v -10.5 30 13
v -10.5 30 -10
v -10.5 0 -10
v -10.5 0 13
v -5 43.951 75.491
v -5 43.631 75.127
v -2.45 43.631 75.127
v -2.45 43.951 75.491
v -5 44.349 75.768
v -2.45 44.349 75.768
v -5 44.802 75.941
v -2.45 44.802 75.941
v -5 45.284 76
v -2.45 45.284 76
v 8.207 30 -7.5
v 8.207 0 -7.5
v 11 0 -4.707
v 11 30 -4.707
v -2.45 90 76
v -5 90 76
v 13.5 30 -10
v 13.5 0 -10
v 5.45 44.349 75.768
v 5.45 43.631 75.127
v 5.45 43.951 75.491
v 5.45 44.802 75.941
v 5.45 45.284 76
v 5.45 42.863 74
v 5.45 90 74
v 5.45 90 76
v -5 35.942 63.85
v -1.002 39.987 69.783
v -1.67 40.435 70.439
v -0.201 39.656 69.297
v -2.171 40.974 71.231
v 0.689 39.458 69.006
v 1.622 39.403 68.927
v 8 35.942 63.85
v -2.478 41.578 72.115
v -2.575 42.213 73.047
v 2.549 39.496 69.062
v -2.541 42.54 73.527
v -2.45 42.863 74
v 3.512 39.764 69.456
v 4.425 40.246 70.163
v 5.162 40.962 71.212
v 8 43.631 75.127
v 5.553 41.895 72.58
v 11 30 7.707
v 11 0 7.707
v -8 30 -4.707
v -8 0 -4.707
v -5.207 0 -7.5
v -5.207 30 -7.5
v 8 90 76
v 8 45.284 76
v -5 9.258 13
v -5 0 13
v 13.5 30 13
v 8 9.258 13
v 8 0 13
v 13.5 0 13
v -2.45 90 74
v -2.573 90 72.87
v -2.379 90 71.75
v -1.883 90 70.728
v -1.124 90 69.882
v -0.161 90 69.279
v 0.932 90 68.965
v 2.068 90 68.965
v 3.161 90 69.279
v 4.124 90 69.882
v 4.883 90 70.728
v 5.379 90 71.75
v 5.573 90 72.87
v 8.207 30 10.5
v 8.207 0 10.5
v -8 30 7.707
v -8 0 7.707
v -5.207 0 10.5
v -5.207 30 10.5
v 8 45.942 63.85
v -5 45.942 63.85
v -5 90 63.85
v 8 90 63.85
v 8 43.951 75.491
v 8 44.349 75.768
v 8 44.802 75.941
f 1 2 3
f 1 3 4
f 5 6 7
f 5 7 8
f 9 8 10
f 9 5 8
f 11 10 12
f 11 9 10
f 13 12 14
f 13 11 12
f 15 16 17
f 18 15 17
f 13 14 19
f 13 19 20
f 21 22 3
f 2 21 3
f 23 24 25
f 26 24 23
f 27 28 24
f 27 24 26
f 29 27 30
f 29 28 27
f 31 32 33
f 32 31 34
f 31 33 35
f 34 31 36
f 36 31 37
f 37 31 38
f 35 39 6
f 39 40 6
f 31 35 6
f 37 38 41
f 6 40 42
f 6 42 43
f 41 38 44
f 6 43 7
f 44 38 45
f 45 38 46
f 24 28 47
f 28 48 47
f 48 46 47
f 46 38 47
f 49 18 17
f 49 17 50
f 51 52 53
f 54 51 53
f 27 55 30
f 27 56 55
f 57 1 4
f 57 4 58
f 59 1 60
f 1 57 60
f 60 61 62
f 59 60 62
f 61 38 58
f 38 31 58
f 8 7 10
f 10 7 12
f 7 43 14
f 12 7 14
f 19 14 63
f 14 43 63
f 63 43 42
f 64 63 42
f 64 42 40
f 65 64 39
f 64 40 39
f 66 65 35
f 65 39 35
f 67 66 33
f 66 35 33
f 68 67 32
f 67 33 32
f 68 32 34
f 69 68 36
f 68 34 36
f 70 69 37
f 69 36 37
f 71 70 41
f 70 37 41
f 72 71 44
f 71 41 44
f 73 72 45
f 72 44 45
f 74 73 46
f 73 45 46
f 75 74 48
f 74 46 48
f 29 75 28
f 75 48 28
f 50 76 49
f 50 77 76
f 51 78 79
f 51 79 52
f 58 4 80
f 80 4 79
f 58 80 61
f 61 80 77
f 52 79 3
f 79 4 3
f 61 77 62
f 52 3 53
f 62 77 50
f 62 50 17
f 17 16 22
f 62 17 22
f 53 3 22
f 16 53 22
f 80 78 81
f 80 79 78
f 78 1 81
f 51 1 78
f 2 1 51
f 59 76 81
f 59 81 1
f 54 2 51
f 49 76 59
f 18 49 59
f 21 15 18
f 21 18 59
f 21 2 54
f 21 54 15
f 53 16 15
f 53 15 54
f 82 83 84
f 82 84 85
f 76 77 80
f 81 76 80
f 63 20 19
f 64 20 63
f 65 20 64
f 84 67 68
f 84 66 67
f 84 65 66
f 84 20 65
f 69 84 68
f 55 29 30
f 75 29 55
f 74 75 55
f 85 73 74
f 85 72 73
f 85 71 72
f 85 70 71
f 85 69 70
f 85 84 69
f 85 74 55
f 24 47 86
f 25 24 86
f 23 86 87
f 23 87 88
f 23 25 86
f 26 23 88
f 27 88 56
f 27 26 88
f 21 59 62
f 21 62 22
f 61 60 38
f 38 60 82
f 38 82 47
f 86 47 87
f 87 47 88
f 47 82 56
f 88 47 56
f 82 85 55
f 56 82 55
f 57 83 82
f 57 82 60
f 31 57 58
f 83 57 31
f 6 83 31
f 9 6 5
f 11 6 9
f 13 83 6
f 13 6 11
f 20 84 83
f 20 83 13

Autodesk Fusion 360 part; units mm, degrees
sketch "Sketch1" plane through (0, 0, 0) normal (0, 1, 0) x (1, 0, 0)
sketch "Sketch2" plane through (0, 0, 0) normal (1, 0, 0) x (0, 0, -1)
sketch "Sketch3" plane through (0, 0, 0) normal (0, 1, 0) x (1, 0, 0)
sketch "Sketch4" plane through (0, 0, 0) normal (0, 1, 0) x (1, 0, 0)
  line L0 (1.5, 7) -> (-5, 7)
  line L1 (8, -10) -> (10.5, -7.5)
  line L2 (10.5, -1.5) -> (10.5, -7.5)
  line L3 (-7.5, -1.5) -> (-7.5, -7.5)
  line L4 (1.5, 7) -> (8, 7)
  line L5 (10.5, -1.5) -> (10.5, -7.5)
  line L6 (1.5, -10) -> (8, -10)
  line L7 (10.5, -10) -> (-7.5, 7) construction
  line L8 (1.5, -10) -> (8, -10)
  line L9 (10.5, 7) -> (10.5, -10)
  line L10 (8, 7) -> (10.5, 4.5)
  line L11 (-7.5, -1.5) -> (-7.5, 4.5)
  line L12 (10.5, -1.5) -> (10.5, 4.5)
  line L13 (-7.5, 7) -> (10.5, 7)
  line L14 (-7.5, -7.5) -> (-5, -10)
  line L15 (-7.5, -10) -> (10.5, 7) construction
  line L16 (-7.5, 4.5) -> (-5, 7)
  line L17 (-7.5, -10) -> (-7.5, 7)
  line L18 (10.5, -10) -> (-7.5, -10)
  line L19 (1.5, -10) -> (-5, -10)
  line L20 (13.5, 10) -> (-10.5, 10)
  line L21 (-10.5, 10) -> (-10.5, -13)
  line L22 (-10.5, -13) -> (13.5, -13)
  line L23 (13.5, -13) -> (13.5, 10)
  line L24 (13.5, 10) -> (-10.5, -13) construction
  line L25 (-10.5, 10) -> (13.5, -13) construction
  line L26 (1.5, -10.5) -> (-5.2071, -10.5)
  line L27 (-8, -7.7071) -> (-5.2071, -10.5)
  line L28 (-8, -1.5) -> (-8, -7.7071)
  line L29 (-8, -1.5) -> (-8, 4.7071)
  line L30 (-8, 4.7071) -> (-5.2071, 7.5)
  line L31 (1.5, 7.5) -> (-5.2071, 7.5)
  line L32 (1.5, 7.5) -> (8.2071, 7.5)
  line L33 (8.2071, 7.5) -> (11, 4.7071)
  line L34 (11, -1.5) -> (11, 4.7071)
  line L35 (11, -1.5) -> (11, -7.7071)
  line L36 (8.2071, -10.5) -> (11, -7.7071)
  line L37 (1.5, -10.5) -> (8.2071, -10.5)
  point P0 (1.5, -1.5)
  point P1 (1.5, -1.5)
  point P2 (1.5, -1.5)
  dimension "d1" = 18
  dimension "d2" = 17
  dimension "d3" = 6
  dimension "d4" = 6
  dimension "d5" = 6.5
  dimension "d6" = 6.5
  dimension "d7" = 6
  dimension "d8" = 6
  dimension "d9" = 6.5
  dimension "d10" = 6.5
  dimension "d11" = 6.5
  dimension "d12" = 6
  dimension "d13" = 24
  dimension "d14" = 23
  dimension "d15" = -0.5
extrude "Extrude1" add sketch "Sketch4" along normal blind 30 contours L13 L17 L30 | L9 L13 L33 | L17 L18 L27 | L9 L18 L36 | L20 L21 L22 L23 makes body 1
sketch "Sketch5" plane through (0, 0, 0) normal (0, -1, 0) x (1, 0, 0)
  line L0 (-8, -4.7071) -> (-8, 7.7071)
  line L1 (-8, 7.7071) -> (-5.2071, 10.5)
  line L2 (-5.2071, 10.5) -> (8.2071, 10.5)
  line L3 (8.2071, 10.5) -> (11, 7.7071)
  line L4 (11, 7.7071) -> (11, -4.7071)
  line L5 (11, -4.7071) -> (8.2071, -7.5)
  line L6 (8.2071, -7.5) -> (-5.2071, -7.5)
  line L7 (-5.2071, -7.5) -> (-8, -4.7071)
  line L8 (13.5, -10) -> (13.5, 13)
  line L9 (13.5, 13) -> (-10.5, 13)
  line L10 (-10.5, 13) -> (-10.5, -10)
  line L11 (-10.5, -10) -> (13.5, -10)
  line L12 (-10.5, 13) -> (13.5, -10)
  line L13 (13.5, 13) -> (-10.5, -10)
  point P0 (1.5, 1.5)
sketch "Sketch6" plane through (0, 0, 0) normal (0, -1, 0) x (1, 0, 0)
  line L0 (-8, -4.7071) -> (-8, 7.7071)
  line L1 (-8, 7.7071) -> (-5.2071, 10.5)
  line L2 (-5.2071, 10.5) -> (8.2071, 10.5)
  line L3 (8.2071, 10.5) -> (11, 7.7071)
  line L4 (11, 7.7071) -> (11, -4.7071)
  line L5 (11, -4.7071) -> (8.2071, -7.5)
  line L6 (8.2071, -7.5) -> (-5.2071, -7.5)
  line L7 (-5.2071, -7.5) -> (-8, -4.7071)
  line L8 (13.5, -10) -> (13.5, 13)
  line L9 (13.5, 13) -> (-10.5, 13)
  line L10 (-10.5, 13) -> (-10.5, -10)
  line L11 (-10.5, -10) -> (13.5, -10)
  line L12 (1.5, 13) -> (1.5, 73)
  dimension "d18" = 60
ref_plane "WorkPlane1" through (1.5, 0, 43) normal (0, -1, 0) x (0, 0, 1)
sketch "Sketch7" plane through (1.5, 0, 43) normal (0, -1, 0) x (0, 0, 1)
  line L0 (-30, 0) -> (-30, -90)
  dimension "d20" = 90
ref_plane "WorkPlane2" through (46.5, 0, 13) normal (0, 0, -1) x (1, 0, 0)
sketch "Sketch25" plane through (1.5, 0, 43) normal (0, -1, 0) x (1, 0, 0)
  circle A0 centre (0, 30) radius 4.075
  dimension "d74" = 8.15
sketch "Sketch26" plane through (0, 0, 0) normal (0, 1, 0) x (1, 0, 0)
  circle A0 centre (1.5, -73) radius 4.075
  line L0 (8, -74) -> (-5, -74)
  line L1 (-5, -74) -> (-5, -63.85)
  line L2 (-5, -63.85) -> (8, -63.85)
  line L3 (8, -63.85) -> (8, -74)
  line L4 (8, -74) -> (-5, -63.85) construction
  line L5 (-5, -74) -> (8, -63.85) construction
  point P0 (1.5, -68.925)
extrude "Extrude18" add sketch "Sketch26" along normal blind 90 separate body contours A0 L0 L1 L2 L3 makes body 2
extrude "Extrude19" add 2 faces at (-3.3003, 60, 74) (7.1501, 30, 74) along direction (0, 0, 1) blind 2 on bodies 2 bodies 2
sketch "Sketch27" plane through (8, 0, 0) normal (1, 0, 0) x (0, 0, -1)
  line L0 (-76, 0) -> (-63.85, 0)
  line L1 (-63.85, 0) -> (-63.85, 90)
  line L2 (-63.85, 90) -> (-76, 90)
  line L3 (-76, 90) -> (-76, 0)
  line L4 (-13, 0) -> (10, 0)
  line L5 (10, 0) -> (10, 30)
  line L6 (10, 30) -> (-13, 30)
  line L7 (-13, 30) -> (-13, 0)
  line L8 (-63.85, 90) -> (-13, 30)
  line L9 (-63.85, 90) -> (-63.85, 75)
  line L10 (-13, 30) -> (-13, 15)
  line L11 (-63.85, 75.12) -> (-13, 15)
  line L12 (-63.85, 45) -> (-38.425, 45.06)
  line L13 (-63.85, 35.9416) -> (-30.7126, 35.9416)
  line L14 (-63.85, 35.9416) -> (-76, 35.9416)
extrude "Extrude20" cut sketch "Sketch27" against normal blind 30 contours L0 L1 L3 L14 bodies 2
sketch "Sketch32" plane through (-5, 0, 0) normal (-1, 0, 0) x (0, 0, 1)
  line L0 (63.85, 35.9416) -> (76, 35.9416)
  line L1 (76, 35.9416) -> (76, 90)
  line L2 (76, 90) -> (63.85, 90)
  line L3 (63.85, 90) -> (63.85, 35.9416)
  line L4 (-10, 0) -> (13, 0)
  line L5 (13, 0) -> (13, 30)
  line L6 (13, 30) -> (-10, 30)
  line L7 (-10, 30) -> (-10, 0)
  line L8 (63.85, 35.9416) -> (13, 0)
  line L9 (63.85, 35.9416) -> (63.85, 45.9416)
  line L10 (63.85, 45.9416) -> (13, 9.2584)
  dimension "d108" = 10
extrude "Extrude28" add sketch "Sketch32" against normal blind 13 contours L3 L5 L8 L9 L10 bodies 1 2
sketch "Sketch33" plane through (8, 0, 0) normal (1, 0, 0) x (0, 0, -1)
  line L0 (-63.85, 35.9416) -> (-83, 49)
  line L1 (-63.85, 35.9416) -> (-76, 35.9416)
  line L2 (-76, 90) -> (-76, 0)
  line L3 (-63.85, 35.9416) -> (-13, 0)
extrude "Extrude29" cut sketch "Sketch33" against normal blind 38 bodies 1
fillet "Fillet4" radius 2 2 edges at (-3.7252, 44.2267, 76) (6.7252, 44.2267, 76) on bodies 1
equation "d13 = 18.000 mm + 6 mm"
equation "d14 = 17.000 mm + 6 mm"
